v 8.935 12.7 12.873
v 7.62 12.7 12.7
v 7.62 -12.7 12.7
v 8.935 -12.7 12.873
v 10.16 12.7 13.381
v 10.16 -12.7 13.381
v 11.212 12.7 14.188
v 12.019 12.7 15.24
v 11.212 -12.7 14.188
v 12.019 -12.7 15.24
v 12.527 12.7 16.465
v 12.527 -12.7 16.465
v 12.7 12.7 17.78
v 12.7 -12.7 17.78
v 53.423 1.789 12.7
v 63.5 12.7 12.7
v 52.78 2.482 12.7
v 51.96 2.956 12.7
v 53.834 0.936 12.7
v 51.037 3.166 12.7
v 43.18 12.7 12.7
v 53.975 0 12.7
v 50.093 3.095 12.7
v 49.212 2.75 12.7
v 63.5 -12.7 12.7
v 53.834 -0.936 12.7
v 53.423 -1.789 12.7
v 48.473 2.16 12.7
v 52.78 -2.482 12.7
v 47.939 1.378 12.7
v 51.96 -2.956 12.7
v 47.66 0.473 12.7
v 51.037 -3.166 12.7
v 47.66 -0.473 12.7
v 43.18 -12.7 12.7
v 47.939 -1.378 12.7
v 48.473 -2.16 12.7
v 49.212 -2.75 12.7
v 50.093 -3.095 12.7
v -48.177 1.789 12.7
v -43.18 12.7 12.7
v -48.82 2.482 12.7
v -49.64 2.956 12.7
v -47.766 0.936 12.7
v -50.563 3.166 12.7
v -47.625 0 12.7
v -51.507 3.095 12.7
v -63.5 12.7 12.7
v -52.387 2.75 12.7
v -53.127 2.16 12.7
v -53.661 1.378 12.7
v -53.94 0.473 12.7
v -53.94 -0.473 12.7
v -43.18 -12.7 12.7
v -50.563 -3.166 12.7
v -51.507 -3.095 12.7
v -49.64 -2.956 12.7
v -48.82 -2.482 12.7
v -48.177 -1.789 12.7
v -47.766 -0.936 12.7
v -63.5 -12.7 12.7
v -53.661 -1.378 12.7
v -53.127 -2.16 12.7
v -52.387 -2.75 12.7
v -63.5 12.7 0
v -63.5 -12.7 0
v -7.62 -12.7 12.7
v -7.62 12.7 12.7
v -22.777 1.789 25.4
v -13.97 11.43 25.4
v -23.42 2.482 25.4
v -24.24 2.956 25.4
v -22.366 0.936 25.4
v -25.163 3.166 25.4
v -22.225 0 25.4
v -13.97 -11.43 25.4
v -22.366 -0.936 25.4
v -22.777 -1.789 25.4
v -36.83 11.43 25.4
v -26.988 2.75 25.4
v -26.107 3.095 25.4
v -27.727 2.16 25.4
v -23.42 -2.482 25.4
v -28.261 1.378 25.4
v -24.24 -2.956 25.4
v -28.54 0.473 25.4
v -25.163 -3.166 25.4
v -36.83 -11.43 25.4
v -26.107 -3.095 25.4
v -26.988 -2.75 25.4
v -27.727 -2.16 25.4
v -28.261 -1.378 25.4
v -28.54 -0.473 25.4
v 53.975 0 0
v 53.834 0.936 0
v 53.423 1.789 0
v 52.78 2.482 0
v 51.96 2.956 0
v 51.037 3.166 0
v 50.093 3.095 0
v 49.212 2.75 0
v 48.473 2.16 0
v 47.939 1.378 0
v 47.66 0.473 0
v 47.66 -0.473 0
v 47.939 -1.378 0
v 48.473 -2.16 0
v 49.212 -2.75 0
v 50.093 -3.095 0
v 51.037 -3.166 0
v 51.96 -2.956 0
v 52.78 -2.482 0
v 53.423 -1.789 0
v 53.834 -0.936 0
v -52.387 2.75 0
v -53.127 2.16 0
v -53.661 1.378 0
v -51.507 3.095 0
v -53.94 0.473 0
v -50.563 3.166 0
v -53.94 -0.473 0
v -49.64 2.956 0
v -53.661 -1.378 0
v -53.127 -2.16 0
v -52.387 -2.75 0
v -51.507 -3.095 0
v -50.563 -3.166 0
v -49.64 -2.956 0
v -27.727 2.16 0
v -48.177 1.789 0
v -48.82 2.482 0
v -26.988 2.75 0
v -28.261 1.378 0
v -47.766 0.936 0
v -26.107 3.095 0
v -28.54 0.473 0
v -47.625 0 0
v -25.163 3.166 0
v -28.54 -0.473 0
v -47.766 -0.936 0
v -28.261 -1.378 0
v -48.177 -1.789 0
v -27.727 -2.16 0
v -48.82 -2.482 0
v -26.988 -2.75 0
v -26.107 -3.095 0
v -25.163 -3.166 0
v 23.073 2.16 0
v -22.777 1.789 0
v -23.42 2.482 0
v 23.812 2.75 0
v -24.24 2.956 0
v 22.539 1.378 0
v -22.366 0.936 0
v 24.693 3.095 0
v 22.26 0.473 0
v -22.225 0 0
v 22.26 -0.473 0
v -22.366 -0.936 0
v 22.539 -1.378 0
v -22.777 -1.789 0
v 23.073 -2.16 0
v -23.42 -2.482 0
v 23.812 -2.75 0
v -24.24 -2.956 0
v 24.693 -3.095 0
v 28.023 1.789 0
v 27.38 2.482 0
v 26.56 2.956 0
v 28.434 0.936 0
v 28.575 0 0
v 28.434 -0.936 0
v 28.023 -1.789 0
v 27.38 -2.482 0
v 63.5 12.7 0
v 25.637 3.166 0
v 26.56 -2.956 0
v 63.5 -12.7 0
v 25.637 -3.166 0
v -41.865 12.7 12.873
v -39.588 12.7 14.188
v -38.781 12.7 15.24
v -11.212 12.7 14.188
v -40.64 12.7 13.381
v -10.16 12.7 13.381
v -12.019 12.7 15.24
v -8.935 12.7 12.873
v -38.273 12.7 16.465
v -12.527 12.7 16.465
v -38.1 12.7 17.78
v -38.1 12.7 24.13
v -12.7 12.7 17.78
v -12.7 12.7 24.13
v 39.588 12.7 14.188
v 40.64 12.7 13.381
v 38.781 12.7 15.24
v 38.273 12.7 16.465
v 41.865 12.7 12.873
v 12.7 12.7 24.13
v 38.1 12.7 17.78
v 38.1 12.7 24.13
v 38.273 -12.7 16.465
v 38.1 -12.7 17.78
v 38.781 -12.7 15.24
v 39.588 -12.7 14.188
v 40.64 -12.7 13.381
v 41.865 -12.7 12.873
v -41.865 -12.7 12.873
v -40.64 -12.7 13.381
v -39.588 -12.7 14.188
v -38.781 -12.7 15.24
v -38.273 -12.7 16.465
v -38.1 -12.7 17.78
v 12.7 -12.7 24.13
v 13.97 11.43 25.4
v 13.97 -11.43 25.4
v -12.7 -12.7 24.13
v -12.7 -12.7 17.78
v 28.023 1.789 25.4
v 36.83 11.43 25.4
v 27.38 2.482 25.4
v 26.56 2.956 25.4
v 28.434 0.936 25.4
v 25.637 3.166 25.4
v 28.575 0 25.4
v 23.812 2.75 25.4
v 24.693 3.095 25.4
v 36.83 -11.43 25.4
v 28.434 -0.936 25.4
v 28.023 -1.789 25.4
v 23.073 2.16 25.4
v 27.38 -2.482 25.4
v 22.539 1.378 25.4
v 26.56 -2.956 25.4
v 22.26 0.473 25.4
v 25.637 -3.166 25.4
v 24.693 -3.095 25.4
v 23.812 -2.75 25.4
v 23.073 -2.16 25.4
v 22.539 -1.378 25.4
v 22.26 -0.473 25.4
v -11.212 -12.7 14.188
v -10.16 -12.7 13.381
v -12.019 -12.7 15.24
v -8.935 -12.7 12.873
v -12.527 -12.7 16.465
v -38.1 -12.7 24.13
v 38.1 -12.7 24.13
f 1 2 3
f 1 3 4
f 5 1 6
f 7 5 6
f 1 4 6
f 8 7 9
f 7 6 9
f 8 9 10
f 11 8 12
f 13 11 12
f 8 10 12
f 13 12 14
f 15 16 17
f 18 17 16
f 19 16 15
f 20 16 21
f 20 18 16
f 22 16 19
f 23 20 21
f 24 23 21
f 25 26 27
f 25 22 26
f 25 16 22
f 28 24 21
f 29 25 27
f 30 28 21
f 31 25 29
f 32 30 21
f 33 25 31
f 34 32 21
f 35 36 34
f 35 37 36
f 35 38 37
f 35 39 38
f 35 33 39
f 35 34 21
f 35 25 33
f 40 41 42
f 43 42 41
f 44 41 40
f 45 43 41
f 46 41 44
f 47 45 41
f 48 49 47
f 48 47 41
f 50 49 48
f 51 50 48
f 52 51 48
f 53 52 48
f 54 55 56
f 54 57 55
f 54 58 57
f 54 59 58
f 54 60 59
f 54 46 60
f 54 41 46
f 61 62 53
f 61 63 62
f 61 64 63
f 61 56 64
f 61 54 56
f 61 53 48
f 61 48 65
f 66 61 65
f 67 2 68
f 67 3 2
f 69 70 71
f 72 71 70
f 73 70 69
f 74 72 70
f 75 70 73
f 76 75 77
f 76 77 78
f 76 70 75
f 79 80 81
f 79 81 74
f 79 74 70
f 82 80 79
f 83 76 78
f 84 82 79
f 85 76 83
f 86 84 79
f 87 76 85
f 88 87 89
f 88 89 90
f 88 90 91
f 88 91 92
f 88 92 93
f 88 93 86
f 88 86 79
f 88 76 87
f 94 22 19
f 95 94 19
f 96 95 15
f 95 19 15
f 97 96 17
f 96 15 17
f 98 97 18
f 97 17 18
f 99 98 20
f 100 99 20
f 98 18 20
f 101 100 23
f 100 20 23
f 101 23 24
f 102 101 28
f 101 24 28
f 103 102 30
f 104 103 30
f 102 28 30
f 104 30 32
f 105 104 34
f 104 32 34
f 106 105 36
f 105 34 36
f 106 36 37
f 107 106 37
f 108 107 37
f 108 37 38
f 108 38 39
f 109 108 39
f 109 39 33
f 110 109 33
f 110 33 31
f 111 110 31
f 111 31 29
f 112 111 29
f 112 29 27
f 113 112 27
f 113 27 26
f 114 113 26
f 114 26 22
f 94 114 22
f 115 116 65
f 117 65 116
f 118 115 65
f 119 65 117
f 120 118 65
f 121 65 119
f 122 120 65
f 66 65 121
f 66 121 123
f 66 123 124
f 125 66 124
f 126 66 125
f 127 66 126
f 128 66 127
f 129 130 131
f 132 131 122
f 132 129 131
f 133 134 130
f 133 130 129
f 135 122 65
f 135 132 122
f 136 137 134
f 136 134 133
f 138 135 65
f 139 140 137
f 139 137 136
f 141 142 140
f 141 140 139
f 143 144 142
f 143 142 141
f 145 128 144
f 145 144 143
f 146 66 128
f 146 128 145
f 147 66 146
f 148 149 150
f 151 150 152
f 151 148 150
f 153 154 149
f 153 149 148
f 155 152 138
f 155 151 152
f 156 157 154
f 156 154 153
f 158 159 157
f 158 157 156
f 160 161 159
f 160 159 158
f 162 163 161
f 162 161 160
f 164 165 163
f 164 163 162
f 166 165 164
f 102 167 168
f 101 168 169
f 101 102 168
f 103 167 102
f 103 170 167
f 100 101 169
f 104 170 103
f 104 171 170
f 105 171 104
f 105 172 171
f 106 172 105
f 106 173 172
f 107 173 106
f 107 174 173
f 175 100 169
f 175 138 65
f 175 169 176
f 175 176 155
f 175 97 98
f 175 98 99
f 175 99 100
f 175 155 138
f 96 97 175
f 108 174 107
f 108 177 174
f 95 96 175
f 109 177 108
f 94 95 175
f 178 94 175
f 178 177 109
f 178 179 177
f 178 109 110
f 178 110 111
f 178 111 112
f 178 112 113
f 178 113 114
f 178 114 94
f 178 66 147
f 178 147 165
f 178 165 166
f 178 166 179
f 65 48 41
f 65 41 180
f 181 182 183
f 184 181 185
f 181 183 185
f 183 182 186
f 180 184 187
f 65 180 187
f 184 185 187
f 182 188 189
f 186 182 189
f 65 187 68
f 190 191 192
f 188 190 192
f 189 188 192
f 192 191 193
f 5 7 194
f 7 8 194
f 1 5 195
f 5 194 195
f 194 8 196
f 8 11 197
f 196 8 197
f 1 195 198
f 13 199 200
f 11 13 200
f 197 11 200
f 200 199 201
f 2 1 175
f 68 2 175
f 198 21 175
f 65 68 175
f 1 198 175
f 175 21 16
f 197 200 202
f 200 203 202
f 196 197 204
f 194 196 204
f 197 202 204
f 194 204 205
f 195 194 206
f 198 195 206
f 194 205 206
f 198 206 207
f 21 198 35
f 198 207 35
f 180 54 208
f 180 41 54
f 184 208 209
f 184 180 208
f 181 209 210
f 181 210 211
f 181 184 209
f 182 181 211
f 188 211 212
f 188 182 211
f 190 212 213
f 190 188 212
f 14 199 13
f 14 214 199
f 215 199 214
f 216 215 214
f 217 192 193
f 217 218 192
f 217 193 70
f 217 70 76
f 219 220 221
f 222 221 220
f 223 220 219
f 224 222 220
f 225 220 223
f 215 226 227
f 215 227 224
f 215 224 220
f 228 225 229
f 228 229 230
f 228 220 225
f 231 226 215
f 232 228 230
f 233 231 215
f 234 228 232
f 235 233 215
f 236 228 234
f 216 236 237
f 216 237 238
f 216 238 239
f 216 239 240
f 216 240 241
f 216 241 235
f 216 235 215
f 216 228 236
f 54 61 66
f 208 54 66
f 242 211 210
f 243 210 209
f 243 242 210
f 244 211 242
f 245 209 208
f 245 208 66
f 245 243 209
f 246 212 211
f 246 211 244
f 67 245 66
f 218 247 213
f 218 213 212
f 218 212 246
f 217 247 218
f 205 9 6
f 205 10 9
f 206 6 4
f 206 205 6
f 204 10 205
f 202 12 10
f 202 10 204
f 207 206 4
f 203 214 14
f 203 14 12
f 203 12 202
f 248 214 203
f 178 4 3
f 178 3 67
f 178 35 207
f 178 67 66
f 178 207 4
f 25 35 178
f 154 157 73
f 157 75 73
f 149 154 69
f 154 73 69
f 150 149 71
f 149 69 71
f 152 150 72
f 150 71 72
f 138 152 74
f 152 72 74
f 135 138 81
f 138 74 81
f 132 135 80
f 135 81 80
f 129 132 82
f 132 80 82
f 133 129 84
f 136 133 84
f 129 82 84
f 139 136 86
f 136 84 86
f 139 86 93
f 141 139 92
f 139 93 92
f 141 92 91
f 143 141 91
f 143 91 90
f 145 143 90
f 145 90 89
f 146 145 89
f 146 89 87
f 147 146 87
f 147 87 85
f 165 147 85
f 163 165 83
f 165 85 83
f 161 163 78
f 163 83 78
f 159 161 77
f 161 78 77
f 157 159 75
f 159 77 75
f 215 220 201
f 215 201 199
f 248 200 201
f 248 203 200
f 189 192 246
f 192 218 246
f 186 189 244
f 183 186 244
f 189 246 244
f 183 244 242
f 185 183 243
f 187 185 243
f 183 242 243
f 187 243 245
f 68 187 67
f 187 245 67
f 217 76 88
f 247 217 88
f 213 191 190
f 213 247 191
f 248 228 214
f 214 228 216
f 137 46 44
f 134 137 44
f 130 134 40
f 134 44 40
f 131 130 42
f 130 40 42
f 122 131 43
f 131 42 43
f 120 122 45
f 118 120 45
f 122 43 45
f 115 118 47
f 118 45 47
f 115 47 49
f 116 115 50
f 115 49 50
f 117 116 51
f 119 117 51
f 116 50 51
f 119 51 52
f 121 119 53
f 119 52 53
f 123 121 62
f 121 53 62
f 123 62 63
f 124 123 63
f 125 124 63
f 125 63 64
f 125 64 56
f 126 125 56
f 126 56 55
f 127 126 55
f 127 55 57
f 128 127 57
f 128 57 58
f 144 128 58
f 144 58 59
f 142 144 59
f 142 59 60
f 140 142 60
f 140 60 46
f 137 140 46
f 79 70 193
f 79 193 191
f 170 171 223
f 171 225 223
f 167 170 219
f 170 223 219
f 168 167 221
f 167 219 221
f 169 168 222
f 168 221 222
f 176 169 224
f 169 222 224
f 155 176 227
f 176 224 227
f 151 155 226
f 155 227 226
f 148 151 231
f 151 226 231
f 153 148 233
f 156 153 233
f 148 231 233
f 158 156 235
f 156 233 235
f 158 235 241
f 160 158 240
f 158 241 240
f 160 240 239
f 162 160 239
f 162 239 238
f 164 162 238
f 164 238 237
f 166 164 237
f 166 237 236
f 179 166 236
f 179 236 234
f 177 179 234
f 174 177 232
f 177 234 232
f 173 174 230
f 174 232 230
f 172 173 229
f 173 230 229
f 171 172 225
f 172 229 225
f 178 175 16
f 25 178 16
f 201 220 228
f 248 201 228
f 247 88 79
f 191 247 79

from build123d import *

# Parameters (mm, degrees)
F1_DEPTH      = 12.7
F1_DEPTH_BACK = 12.7
F2_R          = 3.175
F3_DEPTH      = 12.701
F3_DEPTH_BACK = 12.701
F4_R          = 5.08
F5_SIZE       = 1.27


with BuildPart() as f1:
    # F0 (on Front) → F1 (new body, two sides)
    with BuildSketch(Plane.XZ) as f1_sk:
        Polygon((-63.5, 12.7), (-63.5, 0), (63.5, 0), (63.5, 12.7), (38.1, 12.7), (38.1, 25.4), (12.7, 25.4), (12.7, 12.7), (-12.7, 12.7), (-12.7, 25.4), (-38.1, 25.4), (-38.1, 12.7), align=None)
    extrude(amount=F1_DEPTH)
    extrude(f1_sk.sketch, amount=-F1_DEPTH_BACK)

    # F2 (on face) → F3 (cut, two sides)
    with BuildSketch(Plane.XY.offset(12.7)) as f3_sk:
        with Locations((-50.8, 0)):
            Circle(F2_R)
        with Locations((50.8, 0)):
            Circle(F2_R)
        with Locations((-25.4, 0)):
            Circle(F2_R)
        with Locations((25.4, 0)):
            Circle(F2_R)
    extrude(amount=-F3_DEPTH, mode=Mode.SUBTRACT)
    extrude(f3_sk.sketch, amount=F3_DEPTH_BACK, mode=Mode.SUBTRACT)

    # F4
    f4_edges = [f1.edges().sort_by_distance(p)[0] for p in [
        (-38.1, 0, 12.7),
        (12.7, 0, 12.7),
        (-12.7, 0, 12.7),
        (38.1, 0, 12.7),
    ]]
    fillet(f4_edges, radius=F4_R)

    # F5
    f5_edges = [f1.edges().sort_by_distance(p)[0] for p in [
        (-25.4, -12.7, 25.4),
        (-12.7, 0, 25.4),
        (-25.4, 12.7, 25.4),
        (-38.1, 0, 25.4),
        (12.7, 0, 25.4),
        (25.4, 12.7, 25.4),
        (38.1, 0, 25.4),
        (25.4, -12.7, 25.4),
    ]]
    chamfer(f5_edges, length=F5_SIZE)


solid = f1.part
